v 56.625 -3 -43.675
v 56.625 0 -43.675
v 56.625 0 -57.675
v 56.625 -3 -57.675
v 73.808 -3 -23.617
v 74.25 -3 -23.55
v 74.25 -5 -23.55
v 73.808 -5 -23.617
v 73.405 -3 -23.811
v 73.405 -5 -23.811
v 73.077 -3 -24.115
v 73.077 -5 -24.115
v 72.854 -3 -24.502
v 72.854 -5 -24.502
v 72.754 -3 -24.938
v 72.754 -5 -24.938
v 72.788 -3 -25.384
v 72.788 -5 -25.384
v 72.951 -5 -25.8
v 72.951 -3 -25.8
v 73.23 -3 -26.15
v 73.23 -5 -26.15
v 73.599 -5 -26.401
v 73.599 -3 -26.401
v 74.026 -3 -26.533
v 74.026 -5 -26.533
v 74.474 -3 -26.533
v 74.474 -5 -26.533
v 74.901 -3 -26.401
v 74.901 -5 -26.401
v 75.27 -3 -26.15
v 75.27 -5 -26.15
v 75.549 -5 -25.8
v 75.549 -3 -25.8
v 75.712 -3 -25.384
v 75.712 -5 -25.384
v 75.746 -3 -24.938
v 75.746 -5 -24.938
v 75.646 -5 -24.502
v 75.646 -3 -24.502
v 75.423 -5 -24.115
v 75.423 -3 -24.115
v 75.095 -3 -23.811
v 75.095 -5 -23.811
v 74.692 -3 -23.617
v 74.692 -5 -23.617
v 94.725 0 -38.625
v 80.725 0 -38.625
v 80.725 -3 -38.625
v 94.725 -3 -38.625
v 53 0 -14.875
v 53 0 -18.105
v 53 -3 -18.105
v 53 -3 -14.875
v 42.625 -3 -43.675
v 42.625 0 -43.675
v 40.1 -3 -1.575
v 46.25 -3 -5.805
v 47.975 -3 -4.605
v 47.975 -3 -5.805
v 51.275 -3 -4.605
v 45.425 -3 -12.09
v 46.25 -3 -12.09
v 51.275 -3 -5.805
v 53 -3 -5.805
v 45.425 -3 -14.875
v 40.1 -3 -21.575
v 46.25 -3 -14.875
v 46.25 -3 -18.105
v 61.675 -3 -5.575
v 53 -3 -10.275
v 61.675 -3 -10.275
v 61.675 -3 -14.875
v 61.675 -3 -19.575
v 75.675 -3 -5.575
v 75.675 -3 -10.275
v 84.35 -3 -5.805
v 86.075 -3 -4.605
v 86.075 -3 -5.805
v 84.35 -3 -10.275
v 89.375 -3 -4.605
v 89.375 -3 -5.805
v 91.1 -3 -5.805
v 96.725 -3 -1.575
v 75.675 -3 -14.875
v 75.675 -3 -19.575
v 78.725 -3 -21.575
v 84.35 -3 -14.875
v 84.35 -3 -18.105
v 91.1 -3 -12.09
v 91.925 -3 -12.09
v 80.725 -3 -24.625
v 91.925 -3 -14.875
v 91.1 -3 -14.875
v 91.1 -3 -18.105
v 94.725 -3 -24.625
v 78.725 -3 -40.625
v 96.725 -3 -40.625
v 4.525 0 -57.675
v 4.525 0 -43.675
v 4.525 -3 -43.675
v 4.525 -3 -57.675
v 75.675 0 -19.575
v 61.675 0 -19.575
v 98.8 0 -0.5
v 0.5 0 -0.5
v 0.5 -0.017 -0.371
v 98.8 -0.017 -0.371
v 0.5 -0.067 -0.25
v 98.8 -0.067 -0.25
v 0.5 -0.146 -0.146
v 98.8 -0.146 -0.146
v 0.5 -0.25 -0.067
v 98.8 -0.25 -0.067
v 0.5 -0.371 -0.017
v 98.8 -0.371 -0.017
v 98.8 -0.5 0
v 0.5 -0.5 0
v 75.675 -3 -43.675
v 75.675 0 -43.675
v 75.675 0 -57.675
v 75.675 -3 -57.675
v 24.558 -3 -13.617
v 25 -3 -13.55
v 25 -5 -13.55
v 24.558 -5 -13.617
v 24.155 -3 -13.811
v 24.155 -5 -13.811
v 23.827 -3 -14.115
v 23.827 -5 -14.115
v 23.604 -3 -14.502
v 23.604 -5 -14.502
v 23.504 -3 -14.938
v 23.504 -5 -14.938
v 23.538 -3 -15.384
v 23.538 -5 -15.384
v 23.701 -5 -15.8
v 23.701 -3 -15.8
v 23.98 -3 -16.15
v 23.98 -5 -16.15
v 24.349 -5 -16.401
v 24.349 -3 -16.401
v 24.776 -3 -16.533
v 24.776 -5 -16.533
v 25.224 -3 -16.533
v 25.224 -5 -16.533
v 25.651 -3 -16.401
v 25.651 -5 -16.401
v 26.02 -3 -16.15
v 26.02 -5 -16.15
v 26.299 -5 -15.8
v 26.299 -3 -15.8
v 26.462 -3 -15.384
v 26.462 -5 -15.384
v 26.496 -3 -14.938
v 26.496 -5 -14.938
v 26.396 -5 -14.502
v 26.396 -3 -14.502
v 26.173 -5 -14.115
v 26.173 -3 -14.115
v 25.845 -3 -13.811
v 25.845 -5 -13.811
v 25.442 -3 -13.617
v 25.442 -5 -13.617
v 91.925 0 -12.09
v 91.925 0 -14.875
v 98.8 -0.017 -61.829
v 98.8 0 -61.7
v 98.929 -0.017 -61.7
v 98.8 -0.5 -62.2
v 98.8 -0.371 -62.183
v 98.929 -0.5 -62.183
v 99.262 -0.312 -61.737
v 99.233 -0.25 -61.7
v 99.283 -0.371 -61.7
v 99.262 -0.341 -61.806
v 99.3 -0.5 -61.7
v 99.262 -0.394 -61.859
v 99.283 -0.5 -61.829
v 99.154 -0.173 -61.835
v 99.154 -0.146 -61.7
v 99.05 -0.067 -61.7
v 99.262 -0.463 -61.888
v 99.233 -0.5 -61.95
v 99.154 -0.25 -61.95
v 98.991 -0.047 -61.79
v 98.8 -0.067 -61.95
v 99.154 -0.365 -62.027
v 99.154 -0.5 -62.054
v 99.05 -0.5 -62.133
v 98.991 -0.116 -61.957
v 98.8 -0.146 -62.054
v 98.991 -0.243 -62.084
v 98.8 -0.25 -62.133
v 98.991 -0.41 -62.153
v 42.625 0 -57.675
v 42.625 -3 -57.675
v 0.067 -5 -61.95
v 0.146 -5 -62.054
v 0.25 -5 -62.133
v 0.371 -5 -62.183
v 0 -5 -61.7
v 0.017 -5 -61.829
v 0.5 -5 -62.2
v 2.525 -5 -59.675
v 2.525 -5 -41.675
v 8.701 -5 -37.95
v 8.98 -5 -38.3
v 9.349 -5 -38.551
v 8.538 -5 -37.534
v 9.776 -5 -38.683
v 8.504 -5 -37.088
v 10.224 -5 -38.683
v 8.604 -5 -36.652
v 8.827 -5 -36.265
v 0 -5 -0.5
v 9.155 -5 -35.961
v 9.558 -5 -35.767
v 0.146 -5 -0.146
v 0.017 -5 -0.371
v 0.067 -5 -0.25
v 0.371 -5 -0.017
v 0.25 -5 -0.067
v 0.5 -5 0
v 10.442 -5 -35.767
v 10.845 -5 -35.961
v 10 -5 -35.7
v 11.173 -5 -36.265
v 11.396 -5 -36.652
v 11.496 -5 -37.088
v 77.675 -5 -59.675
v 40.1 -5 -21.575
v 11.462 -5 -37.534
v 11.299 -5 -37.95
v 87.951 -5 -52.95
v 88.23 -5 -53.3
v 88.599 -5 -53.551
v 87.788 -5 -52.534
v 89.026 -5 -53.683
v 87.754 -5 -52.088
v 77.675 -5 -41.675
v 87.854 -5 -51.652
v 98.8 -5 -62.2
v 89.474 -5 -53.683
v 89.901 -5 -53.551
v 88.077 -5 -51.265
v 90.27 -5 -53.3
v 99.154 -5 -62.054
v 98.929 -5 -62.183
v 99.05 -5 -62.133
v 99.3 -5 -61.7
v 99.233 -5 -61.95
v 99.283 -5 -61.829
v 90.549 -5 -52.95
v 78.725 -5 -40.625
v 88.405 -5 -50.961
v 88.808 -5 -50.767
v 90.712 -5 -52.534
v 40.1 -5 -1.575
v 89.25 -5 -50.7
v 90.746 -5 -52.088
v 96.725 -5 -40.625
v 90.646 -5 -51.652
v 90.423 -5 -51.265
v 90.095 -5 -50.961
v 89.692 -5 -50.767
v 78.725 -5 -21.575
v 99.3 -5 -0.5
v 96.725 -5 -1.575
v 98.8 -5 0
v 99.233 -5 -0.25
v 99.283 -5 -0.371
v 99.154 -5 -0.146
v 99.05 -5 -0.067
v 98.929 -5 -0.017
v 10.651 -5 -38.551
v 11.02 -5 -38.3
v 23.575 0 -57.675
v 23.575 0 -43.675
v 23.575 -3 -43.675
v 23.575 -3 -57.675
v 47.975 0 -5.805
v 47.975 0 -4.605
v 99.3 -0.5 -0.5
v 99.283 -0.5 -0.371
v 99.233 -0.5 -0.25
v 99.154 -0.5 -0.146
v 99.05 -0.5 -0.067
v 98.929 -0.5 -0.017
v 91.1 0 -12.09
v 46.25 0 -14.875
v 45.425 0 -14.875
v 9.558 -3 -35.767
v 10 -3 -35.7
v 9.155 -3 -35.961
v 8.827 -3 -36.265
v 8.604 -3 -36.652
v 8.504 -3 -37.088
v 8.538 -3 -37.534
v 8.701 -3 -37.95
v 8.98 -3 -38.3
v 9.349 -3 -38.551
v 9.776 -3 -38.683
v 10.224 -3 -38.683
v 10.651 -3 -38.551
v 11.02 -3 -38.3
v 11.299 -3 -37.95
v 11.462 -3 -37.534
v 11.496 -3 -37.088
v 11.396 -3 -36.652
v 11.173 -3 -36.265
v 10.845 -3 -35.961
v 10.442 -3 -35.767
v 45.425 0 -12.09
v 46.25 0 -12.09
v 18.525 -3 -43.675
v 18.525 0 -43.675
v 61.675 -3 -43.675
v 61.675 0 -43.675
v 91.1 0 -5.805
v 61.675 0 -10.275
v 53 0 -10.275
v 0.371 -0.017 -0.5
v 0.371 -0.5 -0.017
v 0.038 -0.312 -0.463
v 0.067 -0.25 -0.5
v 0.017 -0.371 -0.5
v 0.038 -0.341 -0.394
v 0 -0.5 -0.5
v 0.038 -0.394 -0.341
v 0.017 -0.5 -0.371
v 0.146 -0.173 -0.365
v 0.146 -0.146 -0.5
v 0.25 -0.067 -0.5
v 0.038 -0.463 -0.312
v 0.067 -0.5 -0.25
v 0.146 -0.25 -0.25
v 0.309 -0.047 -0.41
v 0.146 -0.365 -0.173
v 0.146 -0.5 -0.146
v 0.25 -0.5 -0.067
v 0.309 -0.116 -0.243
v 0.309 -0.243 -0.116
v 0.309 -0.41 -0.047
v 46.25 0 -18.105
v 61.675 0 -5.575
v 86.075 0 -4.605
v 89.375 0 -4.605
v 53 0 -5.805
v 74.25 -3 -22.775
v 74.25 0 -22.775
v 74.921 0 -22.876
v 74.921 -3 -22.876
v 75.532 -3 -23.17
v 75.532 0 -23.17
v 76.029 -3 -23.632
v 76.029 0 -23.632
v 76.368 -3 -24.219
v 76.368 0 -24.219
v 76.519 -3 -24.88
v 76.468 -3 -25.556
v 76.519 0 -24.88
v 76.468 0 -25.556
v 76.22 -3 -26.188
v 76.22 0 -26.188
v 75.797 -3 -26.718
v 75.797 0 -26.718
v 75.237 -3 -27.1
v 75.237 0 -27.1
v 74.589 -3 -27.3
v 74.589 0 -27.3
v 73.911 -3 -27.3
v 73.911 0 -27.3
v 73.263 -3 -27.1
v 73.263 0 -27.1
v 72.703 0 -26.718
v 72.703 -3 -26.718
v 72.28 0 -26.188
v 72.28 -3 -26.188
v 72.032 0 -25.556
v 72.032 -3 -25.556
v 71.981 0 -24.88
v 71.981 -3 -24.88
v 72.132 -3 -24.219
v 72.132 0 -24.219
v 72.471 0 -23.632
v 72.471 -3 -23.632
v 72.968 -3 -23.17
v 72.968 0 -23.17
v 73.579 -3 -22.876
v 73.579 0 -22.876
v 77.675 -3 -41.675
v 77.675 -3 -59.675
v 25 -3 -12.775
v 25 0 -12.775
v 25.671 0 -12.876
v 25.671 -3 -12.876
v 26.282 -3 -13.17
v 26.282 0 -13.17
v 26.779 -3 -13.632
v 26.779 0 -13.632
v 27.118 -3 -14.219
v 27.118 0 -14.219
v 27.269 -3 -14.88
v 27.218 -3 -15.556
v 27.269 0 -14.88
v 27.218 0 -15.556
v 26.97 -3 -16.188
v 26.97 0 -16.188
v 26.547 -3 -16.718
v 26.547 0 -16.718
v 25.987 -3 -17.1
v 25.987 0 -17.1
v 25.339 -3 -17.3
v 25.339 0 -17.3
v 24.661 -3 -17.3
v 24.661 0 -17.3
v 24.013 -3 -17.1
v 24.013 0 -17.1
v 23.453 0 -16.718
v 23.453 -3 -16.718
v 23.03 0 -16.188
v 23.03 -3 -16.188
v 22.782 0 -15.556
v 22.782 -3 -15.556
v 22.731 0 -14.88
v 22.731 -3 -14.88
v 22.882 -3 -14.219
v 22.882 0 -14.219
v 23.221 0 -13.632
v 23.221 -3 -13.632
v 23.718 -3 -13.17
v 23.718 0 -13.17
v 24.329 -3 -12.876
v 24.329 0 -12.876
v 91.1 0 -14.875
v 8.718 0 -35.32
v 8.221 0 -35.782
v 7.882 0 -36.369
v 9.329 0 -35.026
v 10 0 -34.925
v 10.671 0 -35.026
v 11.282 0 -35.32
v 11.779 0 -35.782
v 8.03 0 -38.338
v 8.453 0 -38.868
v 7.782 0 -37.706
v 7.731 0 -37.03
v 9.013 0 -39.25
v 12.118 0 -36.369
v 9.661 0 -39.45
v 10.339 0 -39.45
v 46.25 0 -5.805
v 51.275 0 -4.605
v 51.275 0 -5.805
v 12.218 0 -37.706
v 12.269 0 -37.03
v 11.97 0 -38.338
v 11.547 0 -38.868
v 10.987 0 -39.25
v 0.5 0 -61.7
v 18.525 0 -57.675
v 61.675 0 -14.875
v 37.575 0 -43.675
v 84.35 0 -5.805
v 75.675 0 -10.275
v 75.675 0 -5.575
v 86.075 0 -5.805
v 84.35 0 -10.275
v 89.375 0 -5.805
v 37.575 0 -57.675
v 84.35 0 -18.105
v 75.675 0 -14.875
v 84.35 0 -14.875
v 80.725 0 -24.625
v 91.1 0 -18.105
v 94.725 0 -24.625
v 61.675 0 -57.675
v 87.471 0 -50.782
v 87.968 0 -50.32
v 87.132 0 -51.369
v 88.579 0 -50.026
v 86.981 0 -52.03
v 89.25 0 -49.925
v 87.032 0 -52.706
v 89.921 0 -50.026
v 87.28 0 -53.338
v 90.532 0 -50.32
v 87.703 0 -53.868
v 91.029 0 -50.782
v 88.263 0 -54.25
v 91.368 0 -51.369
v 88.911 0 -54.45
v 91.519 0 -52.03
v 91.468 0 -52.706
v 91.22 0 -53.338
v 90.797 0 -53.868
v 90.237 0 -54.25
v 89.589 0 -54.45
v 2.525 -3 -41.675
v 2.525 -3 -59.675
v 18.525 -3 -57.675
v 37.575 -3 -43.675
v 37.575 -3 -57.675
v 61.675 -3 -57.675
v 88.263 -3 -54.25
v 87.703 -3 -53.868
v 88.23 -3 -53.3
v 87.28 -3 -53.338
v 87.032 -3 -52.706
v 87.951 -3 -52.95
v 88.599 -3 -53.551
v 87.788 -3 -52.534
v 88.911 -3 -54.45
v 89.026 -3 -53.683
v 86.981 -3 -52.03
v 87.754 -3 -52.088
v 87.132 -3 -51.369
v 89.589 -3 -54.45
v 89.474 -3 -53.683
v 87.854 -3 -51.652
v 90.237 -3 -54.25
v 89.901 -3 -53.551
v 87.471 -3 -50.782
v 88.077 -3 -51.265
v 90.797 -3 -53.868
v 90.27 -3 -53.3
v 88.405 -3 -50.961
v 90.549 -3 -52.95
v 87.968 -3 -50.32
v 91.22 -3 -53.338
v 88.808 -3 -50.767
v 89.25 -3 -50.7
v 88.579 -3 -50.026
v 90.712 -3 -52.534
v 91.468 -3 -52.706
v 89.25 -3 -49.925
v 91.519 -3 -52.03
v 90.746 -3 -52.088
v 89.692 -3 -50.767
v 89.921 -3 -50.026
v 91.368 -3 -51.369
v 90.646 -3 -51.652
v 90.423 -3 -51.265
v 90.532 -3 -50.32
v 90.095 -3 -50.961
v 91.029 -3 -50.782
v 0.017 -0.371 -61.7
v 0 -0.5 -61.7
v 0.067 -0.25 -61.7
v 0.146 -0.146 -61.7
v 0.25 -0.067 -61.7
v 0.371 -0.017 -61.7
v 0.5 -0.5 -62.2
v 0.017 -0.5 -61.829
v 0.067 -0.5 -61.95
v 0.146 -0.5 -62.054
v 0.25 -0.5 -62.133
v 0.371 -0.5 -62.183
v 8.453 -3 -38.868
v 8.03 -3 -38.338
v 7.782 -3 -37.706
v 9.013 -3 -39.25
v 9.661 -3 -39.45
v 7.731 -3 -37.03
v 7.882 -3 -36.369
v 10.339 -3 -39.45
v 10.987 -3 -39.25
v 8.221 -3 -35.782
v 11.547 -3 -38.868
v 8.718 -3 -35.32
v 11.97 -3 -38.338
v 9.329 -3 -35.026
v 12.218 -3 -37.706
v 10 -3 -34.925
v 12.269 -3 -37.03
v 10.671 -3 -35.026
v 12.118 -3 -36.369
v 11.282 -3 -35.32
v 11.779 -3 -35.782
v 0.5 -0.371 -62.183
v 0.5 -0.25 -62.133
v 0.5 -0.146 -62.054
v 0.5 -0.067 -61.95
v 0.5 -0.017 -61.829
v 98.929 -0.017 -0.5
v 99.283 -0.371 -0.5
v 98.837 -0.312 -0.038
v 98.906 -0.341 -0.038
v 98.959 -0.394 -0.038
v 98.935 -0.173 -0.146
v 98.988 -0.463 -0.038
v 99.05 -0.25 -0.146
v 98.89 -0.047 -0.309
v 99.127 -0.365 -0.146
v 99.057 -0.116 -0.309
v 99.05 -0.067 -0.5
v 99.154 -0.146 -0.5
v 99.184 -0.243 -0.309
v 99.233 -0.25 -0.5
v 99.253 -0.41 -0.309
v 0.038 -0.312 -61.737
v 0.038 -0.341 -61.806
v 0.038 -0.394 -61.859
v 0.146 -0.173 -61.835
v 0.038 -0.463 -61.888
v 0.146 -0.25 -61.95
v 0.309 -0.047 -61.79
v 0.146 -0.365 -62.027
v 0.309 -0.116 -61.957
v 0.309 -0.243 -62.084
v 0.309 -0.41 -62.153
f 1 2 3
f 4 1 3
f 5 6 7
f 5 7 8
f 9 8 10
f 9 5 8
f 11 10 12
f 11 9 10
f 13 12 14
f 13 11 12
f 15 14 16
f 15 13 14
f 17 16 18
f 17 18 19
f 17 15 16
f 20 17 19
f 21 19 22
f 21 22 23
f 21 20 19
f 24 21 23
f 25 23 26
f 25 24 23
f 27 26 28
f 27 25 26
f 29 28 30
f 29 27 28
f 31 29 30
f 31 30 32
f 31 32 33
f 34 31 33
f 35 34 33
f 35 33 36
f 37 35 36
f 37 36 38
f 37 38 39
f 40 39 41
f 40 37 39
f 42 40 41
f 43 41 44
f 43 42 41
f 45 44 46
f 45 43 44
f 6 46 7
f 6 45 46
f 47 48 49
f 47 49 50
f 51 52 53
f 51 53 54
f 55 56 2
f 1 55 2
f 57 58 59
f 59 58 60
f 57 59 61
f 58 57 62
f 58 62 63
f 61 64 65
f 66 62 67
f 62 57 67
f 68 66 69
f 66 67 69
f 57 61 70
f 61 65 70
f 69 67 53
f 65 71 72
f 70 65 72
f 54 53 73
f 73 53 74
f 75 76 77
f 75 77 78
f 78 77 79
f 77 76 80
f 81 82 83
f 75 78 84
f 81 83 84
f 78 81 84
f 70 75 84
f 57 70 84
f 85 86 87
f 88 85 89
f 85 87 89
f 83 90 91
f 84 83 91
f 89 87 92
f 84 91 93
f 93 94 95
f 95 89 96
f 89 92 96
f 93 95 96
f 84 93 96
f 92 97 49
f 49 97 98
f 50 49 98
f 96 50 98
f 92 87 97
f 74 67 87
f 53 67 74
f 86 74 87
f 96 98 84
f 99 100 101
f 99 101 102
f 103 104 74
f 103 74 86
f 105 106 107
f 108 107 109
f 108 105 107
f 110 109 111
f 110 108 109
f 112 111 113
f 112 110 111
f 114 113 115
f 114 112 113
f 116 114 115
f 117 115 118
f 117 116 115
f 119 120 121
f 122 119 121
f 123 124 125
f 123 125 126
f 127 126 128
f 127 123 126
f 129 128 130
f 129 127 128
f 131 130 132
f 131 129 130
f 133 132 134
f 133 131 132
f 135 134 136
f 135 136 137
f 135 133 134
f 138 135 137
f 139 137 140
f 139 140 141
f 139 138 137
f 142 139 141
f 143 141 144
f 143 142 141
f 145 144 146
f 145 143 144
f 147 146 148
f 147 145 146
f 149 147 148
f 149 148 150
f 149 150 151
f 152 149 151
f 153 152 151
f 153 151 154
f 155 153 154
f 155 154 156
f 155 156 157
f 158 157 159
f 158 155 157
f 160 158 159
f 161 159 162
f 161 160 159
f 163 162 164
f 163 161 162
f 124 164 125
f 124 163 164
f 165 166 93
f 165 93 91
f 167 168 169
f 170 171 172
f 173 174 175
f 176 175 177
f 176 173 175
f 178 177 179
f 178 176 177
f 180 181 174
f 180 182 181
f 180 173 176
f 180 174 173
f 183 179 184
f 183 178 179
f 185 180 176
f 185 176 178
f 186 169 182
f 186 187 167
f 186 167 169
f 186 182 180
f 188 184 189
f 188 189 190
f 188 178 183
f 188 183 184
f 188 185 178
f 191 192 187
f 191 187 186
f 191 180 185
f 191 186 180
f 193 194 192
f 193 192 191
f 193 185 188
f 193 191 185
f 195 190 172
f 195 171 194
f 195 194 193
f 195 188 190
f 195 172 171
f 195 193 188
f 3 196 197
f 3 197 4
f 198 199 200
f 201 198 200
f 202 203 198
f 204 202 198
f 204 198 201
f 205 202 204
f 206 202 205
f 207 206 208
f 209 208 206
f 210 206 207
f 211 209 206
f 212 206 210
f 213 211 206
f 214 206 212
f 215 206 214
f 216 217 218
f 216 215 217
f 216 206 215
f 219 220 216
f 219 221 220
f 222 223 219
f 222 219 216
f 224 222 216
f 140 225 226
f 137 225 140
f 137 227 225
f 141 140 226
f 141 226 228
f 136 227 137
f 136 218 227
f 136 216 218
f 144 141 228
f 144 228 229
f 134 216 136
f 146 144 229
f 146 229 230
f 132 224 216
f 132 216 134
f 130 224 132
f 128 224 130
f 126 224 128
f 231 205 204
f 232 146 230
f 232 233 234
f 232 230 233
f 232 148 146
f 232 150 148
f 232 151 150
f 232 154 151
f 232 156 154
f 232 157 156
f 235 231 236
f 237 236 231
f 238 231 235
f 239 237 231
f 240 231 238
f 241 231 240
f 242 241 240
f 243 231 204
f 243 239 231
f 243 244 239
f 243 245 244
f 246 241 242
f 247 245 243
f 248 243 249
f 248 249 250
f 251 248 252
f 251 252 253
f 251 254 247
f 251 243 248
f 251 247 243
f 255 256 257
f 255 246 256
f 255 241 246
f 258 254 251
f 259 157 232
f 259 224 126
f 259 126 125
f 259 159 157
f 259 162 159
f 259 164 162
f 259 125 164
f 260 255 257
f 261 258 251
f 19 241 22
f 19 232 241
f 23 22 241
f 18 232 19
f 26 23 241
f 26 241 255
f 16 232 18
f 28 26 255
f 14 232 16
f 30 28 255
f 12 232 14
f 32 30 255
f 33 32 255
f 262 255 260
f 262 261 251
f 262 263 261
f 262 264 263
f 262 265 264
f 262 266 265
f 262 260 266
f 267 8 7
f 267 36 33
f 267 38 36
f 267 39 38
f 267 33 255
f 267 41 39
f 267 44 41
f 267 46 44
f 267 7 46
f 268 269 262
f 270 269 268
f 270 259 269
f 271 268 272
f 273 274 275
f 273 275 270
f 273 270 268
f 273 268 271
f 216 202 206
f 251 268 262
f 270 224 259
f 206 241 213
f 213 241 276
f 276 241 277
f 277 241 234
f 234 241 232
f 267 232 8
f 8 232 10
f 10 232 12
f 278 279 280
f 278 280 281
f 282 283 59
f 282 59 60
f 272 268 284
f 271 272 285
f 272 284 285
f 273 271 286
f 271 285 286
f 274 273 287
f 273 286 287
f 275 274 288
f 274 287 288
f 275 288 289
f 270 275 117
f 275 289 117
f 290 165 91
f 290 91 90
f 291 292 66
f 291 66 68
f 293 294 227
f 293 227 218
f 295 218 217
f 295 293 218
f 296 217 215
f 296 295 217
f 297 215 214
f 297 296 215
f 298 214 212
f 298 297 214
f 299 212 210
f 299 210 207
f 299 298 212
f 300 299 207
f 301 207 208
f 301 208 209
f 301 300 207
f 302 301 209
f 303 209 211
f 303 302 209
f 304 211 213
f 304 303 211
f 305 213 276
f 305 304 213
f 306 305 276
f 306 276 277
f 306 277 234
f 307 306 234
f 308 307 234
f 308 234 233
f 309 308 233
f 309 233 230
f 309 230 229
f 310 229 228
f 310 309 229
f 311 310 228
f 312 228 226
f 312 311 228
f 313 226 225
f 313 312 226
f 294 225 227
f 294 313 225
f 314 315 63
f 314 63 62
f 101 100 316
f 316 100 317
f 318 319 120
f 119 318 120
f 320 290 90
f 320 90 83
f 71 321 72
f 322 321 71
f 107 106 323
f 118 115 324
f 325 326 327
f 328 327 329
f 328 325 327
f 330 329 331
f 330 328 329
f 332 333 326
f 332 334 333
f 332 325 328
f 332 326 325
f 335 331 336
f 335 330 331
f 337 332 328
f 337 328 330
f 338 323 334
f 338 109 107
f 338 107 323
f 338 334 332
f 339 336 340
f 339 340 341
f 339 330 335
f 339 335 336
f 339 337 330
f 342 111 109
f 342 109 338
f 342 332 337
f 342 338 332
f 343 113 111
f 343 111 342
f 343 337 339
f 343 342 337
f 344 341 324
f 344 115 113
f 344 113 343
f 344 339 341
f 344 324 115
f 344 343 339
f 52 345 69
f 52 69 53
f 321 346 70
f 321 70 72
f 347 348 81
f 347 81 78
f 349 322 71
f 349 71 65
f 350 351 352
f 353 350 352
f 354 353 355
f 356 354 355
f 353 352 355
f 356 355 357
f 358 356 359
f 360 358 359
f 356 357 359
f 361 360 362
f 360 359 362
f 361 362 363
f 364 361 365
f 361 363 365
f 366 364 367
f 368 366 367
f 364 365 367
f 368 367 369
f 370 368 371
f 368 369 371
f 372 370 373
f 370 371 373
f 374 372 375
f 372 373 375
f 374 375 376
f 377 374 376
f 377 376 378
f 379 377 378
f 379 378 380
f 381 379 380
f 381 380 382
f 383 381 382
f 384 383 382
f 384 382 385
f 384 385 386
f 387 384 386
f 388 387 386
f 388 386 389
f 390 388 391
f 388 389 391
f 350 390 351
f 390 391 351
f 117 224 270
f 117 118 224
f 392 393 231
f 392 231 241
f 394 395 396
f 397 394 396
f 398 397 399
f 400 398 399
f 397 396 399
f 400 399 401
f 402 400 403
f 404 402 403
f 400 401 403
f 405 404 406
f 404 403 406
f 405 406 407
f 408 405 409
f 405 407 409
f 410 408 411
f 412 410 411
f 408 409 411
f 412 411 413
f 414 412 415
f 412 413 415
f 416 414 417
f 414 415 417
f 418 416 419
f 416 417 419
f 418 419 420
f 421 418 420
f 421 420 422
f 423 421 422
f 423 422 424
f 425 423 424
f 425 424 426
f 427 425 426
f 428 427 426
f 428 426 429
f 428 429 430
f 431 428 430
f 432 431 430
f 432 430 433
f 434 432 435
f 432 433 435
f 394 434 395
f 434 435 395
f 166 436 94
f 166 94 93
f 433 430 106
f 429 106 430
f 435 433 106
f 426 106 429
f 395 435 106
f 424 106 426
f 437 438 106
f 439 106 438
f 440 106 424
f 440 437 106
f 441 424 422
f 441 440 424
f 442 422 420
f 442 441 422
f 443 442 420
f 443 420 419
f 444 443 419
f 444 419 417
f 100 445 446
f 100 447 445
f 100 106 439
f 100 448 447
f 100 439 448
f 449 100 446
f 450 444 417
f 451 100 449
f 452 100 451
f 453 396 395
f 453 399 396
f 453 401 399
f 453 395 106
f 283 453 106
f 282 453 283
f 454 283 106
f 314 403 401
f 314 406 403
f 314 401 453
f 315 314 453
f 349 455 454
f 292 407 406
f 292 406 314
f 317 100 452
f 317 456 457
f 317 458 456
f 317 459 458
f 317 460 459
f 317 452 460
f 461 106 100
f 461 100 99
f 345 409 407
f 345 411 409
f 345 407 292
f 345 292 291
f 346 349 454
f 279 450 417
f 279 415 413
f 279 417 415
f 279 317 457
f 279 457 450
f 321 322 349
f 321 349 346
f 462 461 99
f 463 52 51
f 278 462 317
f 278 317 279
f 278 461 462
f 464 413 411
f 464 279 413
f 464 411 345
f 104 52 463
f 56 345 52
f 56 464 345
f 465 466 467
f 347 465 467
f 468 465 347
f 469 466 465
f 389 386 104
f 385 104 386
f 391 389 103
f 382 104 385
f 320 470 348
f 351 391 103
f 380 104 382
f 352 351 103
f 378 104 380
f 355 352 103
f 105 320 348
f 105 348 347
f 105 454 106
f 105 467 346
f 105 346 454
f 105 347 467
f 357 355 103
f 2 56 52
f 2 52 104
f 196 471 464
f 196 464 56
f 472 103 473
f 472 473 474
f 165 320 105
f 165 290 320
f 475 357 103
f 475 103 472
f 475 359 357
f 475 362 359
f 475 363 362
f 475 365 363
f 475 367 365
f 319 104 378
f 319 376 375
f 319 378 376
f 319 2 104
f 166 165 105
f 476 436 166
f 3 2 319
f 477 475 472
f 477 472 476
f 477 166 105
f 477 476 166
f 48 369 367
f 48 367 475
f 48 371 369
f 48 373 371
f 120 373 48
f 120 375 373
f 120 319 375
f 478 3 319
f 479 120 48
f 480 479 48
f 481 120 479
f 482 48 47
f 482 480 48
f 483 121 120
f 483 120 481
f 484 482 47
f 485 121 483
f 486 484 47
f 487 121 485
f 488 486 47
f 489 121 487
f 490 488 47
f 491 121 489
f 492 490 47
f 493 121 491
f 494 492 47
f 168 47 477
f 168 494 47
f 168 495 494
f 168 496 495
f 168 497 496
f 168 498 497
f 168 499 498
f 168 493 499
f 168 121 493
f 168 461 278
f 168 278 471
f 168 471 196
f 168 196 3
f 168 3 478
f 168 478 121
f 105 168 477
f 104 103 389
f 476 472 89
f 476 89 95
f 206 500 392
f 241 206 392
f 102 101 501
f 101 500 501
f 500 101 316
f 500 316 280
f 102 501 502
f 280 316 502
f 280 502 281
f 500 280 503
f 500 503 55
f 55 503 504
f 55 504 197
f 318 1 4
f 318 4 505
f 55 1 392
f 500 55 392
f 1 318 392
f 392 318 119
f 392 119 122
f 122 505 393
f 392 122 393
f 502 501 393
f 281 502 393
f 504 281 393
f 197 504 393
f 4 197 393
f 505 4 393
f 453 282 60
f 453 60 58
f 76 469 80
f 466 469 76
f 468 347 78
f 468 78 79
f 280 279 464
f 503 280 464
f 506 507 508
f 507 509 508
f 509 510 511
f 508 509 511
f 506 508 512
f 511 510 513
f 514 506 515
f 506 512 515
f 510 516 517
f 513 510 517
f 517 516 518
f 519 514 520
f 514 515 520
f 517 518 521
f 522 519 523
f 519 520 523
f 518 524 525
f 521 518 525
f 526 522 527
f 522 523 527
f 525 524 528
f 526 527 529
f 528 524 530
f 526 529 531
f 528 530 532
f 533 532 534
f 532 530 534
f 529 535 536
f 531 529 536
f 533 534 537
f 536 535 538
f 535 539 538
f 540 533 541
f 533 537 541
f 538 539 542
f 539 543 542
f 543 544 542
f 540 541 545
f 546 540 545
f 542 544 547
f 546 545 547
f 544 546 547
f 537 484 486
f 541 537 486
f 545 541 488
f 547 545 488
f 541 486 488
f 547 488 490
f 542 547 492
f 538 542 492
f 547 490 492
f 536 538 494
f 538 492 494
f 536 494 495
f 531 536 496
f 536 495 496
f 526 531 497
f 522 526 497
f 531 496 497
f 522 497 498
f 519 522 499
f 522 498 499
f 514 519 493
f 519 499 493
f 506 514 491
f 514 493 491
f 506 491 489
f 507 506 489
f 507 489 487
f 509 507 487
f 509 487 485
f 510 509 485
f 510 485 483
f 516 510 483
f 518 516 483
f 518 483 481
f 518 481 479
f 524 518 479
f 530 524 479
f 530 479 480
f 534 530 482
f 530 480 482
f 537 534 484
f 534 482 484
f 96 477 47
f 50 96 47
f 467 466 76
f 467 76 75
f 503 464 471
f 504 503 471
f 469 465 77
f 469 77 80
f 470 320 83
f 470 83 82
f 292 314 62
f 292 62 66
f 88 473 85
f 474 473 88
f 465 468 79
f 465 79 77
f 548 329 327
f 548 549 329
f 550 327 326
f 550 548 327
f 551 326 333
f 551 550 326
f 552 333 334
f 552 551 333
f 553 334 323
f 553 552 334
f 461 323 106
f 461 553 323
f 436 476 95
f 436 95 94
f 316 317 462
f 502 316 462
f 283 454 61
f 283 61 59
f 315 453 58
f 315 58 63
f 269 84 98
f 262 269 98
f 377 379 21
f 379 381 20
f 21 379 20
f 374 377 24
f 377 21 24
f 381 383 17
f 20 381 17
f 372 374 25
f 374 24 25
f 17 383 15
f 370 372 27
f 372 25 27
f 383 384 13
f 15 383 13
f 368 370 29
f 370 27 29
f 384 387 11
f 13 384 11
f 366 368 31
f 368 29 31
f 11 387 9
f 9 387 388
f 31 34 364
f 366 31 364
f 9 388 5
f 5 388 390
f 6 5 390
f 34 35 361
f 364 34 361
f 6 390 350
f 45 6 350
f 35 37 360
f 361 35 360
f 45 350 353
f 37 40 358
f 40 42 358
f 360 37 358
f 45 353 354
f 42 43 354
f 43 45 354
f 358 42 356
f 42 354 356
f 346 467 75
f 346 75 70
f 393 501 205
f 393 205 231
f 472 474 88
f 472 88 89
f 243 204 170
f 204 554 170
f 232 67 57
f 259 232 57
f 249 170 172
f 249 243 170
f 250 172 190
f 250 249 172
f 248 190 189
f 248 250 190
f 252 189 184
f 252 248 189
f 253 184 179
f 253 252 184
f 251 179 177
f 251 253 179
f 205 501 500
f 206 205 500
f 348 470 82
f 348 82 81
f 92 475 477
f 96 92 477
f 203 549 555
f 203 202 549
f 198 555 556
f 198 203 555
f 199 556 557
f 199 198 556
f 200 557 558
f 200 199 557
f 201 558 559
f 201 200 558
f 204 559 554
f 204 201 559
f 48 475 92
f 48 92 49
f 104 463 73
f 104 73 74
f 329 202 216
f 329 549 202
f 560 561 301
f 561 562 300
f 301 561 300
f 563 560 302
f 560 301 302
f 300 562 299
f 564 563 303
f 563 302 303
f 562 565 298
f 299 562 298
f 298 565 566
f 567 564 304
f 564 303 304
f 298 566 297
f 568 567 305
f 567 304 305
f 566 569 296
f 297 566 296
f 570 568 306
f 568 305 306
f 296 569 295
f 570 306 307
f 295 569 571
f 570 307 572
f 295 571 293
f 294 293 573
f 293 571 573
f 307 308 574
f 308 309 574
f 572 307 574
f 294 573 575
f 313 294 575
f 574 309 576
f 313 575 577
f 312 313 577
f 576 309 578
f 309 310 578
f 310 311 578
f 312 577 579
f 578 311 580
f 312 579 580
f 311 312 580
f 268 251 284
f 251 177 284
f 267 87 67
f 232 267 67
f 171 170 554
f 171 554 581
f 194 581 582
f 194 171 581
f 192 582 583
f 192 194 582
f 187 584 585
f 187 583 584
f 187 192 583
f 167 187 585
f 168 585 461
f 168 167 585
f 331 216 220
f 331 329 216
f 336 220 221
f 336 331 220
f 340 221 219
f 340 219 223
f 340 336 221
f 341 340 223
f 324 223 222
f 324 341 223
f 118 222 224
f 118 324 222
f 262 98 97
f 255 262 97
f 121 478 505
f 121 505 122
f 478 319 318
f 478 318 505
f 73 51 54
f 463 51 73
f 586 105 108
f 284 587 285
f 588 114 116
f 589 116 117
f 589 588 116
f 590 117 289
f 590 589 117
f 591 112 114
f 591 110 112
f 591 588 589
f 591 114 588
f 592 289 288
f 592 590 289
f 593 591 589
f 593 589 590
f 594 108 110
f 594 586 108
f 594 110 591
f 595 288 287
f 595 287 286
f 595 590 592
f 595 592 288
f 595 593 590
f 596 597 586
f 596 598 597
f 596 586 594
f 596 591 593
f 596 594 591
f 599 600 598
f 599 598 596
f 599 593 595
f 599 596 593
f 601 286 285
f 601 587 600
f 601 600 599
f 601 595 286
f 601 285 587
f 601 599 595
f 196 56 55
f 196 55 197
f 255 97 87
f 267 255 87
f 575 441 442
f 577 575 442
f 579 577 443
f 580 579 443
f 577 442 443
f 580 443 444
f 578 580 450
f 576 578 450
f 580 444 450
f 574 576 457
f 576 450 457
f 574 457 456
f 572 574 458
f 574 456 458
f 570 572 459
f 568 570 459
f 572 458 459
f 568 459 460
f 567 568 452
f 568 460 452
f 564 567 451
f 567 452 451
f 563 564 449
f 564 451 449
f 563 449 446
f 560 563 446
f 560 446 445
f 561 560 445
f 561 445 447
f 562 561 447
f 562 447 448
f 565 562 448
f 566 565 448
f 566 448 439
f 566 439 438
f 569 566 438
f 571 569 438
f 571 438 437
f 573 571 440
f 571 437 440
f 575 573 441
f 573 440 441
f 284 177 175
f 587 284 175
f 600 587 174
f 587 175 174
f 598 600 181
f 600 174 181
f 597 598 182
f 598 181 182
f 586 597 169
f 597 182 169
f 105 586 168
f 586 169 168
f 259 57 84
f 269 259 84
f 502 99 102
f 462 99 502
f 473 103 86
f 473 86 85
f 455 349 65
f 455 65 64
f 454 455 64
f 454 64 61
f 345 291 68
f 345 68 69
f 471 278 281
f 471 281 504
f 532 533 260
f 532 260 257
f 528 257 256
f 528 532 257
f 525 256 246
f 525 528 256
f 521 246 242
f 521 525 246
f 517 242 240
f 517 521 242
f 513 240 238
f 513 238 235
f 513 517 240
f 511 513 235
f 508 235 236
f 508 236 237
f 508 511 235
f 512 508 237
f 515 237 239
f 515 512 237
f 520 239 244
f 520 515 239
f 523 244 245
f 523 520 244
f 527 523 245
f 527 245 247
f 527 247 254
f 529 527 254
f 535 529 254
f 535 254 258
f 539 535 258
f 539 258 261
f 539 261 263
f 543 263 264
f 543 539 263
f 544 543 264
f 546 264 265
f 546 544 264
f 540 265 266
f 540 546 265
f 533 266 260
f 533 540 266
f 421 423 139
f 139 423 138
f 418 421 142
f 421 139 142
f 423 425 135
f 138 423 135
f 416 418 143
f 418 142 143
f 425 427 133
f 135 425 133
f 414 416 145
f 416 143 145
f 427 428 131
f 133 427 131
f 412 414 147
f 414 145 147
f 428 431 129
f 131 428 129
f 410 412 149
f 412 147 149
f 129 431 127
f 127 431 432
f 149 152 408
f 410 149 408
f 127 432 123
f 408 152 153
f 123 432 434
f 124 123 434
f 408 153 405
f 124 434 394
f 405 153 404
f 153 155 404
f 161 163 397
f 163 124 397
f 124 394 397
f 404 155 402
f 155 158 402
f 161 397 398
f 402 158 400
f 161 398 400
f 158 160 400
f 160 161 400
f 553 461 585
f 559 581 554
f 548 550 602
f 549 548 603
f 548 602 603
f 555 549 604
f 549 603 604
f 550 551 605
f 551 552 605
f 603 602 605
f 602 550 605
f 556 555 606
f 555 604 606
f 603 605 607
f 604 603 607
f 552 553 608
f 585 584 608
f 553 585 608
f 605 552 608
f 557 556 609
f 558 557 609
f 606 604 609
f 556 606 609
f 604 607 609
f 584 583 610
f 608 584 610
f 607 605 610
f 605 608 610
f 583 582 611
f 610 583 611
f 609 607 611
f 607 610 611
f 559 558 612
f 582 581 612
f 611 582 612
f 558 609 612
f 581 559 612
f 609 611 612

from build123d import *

# Parameters (mm, degrees)
SKETCH1_W           = 99.3
SKETCH1_H           = 62.2
SKETCH1_R           = 2.275
SKETCH1_W_2         = 14
SKETCH1_H_2         = 14
BOSS_EXTRUDE1_DEPTH = 3
SKETCH6_W           = 99.3
SKETCH6_H           = 62.2
SKETCH6_R           = 1.5
SKETCH6_W_2         = 75.15
SKETCH6_H_2         = 18
BOSS_EXTRUDE2_DEPTH = 2
FILLET1_R           = 0.5


with BuildPart() as part:
    # Sketch1 → Boss-Extrude1 (new body)
    with BuildSketch(Plane(origin=(0, 0, 0), x_dir=(1, 0, 0), z_dir=(0, 1, 0))):
        with Locations((49.65, 31.1)):
            Rectangle(SKETCH1_W, SKETCH1_H)
        with Locations(Location((10, 37.2, 0), (0, 0, 270))):
            Circle(SKETCH1_R, mode=Mode.SUBTRACT)
        with Locations(Location((89.25, 52.2, 0), (0, 0, 270))):
            Circle(SKETCH1_R, mode=Mode.SUBTRACT)
        with Locations(Location((74.25, 25.05, 0), (0, 0, 270))):
            Circle(SKETCH1_R, mode=Mode.SUBTRACT)
        with Locations(Location((25, 15.05, 0), (0, 0, 270))):
            Circle(SKETCH1_R, mode=Mode.SUBTRACT)
        with Locations((11.525, 50.675)):
            Rectangle(SKETCH1_W_2, SKETCH1_H_2, mode=Mode.SUBTRACT)
        with Locations((30.575, 50.675)):
            Rectangle(SKETCH1_W_2, SKETCH1_H_2, mode=Mode.SUBTRACT)
        with Locations((49.625, 50.675)):
            Rectangle(SKETCH1_W_2, SKETCH1_H_2, mode=Mode.SUBTRACT)
        with Locations((68.675, 50.675)):
            Rectangle(SKETCH1_W_2, SKETCH1_H_2, mode=Mode.SUBTRACT)
        with Locations((87.725, 31.625)):
            Rectangle(SKETCH1_W_2, SKETCH1_H_2, mode=Mode.SUBTRACT)
        Polygon((75.675, 14.875), (84.35, 14.875), (84.35, 18.105), (91.1, 18.105), (91.1, 14.875), (91.925, 14.875), (91.925, 12.09), (91.1, 12.09), (91.1, 5.805), (89.375, 5.805), (89.375, 4.605), (86.075, 4.605), (86.075, 5.805), (84.35, 5.805), (84.35, 10.275), (75.675, 10.275), (75.675, 5.575), (61.675, 5.575), (61.675, 10.275), (53, 10.275), (53, 5.805), (51.275, 5.805), (51.275, 4.605), (47.975, 4.605), (47.975, 5.805), (46.25, 5.805), (46.25, 12.09), (45.425, 12.09), (45.425, 14.875), (46.25, 14.875), (46.25, 18.105), (53, 18.105), (53, 14.875), (61.675, 14.875), (61.675, 19.575), (75.675, 19.575), align=None, mode=Mode.SUBTRACT)
    extrude(amount=-BOSS_EXTRUDE1_DEPTH)

    # Sketch6 → Boss-Extrude2 (add)
    with BuildSketch(Plane.XZ.offset(3)):
        with Locations((49.65, -31.1)):
            Rectangle(SKETCH6_W, SKETCH6_H)
        with Locations(Location((89.25, -52.2, 0), (0, 0, 90))):
            Circle(SKETCH6_R, mode=Mode.SUBTRACT)
        with Locations(Location((74.25, -25.05, 0), (0, 0, 90))):
            Circle(SKETCH6_R, mode=Mode.SUBTRACT)
        with Locations(Location((25, -15.05, 0), (0, 0, 90))):
            Circle(SKETCH6_R, mode=Mode.SUBTRACT)
        with Locations(Location((10, -37.2, 0), (0, 0, 90))):
            Circle(SKETCH6_R, mode=Mode.SUBTRACT)
        Polygon((78.725, -21.575), (40.1, -21.575), (40.1, -1.575), (96.725, -1.575), (96.725, -40.625), (78.725, -40.625), align=None, mode=Mode.SUBTRACT)
        with Locations((40.1, -50.675)):
            Rectangle(SKETCH6_W_2, SKETCH6_H_2, mode=Mode.SUBTRACT)
    extrude(amount=BOSS_EXTRUDE2_DEPTH)

    # Fillet1
    fillet1_edges = [part.edges().sort_by_distance(p)[0] for p in [
        (49.65, 0, -62.2),
        (99.3, 0, -31.1),
        (49.65, 0, 0),
        (0, 0, -31.1),
        (0, -2.5, -62.2),
        (99.3, -2.5, -62.2),
        (99.3, -2.5, 0),
        (0, -2.5, 0),
    ]]
    fillet(fillet1_edges, radius=FILLET1_R)


solid = part.part
